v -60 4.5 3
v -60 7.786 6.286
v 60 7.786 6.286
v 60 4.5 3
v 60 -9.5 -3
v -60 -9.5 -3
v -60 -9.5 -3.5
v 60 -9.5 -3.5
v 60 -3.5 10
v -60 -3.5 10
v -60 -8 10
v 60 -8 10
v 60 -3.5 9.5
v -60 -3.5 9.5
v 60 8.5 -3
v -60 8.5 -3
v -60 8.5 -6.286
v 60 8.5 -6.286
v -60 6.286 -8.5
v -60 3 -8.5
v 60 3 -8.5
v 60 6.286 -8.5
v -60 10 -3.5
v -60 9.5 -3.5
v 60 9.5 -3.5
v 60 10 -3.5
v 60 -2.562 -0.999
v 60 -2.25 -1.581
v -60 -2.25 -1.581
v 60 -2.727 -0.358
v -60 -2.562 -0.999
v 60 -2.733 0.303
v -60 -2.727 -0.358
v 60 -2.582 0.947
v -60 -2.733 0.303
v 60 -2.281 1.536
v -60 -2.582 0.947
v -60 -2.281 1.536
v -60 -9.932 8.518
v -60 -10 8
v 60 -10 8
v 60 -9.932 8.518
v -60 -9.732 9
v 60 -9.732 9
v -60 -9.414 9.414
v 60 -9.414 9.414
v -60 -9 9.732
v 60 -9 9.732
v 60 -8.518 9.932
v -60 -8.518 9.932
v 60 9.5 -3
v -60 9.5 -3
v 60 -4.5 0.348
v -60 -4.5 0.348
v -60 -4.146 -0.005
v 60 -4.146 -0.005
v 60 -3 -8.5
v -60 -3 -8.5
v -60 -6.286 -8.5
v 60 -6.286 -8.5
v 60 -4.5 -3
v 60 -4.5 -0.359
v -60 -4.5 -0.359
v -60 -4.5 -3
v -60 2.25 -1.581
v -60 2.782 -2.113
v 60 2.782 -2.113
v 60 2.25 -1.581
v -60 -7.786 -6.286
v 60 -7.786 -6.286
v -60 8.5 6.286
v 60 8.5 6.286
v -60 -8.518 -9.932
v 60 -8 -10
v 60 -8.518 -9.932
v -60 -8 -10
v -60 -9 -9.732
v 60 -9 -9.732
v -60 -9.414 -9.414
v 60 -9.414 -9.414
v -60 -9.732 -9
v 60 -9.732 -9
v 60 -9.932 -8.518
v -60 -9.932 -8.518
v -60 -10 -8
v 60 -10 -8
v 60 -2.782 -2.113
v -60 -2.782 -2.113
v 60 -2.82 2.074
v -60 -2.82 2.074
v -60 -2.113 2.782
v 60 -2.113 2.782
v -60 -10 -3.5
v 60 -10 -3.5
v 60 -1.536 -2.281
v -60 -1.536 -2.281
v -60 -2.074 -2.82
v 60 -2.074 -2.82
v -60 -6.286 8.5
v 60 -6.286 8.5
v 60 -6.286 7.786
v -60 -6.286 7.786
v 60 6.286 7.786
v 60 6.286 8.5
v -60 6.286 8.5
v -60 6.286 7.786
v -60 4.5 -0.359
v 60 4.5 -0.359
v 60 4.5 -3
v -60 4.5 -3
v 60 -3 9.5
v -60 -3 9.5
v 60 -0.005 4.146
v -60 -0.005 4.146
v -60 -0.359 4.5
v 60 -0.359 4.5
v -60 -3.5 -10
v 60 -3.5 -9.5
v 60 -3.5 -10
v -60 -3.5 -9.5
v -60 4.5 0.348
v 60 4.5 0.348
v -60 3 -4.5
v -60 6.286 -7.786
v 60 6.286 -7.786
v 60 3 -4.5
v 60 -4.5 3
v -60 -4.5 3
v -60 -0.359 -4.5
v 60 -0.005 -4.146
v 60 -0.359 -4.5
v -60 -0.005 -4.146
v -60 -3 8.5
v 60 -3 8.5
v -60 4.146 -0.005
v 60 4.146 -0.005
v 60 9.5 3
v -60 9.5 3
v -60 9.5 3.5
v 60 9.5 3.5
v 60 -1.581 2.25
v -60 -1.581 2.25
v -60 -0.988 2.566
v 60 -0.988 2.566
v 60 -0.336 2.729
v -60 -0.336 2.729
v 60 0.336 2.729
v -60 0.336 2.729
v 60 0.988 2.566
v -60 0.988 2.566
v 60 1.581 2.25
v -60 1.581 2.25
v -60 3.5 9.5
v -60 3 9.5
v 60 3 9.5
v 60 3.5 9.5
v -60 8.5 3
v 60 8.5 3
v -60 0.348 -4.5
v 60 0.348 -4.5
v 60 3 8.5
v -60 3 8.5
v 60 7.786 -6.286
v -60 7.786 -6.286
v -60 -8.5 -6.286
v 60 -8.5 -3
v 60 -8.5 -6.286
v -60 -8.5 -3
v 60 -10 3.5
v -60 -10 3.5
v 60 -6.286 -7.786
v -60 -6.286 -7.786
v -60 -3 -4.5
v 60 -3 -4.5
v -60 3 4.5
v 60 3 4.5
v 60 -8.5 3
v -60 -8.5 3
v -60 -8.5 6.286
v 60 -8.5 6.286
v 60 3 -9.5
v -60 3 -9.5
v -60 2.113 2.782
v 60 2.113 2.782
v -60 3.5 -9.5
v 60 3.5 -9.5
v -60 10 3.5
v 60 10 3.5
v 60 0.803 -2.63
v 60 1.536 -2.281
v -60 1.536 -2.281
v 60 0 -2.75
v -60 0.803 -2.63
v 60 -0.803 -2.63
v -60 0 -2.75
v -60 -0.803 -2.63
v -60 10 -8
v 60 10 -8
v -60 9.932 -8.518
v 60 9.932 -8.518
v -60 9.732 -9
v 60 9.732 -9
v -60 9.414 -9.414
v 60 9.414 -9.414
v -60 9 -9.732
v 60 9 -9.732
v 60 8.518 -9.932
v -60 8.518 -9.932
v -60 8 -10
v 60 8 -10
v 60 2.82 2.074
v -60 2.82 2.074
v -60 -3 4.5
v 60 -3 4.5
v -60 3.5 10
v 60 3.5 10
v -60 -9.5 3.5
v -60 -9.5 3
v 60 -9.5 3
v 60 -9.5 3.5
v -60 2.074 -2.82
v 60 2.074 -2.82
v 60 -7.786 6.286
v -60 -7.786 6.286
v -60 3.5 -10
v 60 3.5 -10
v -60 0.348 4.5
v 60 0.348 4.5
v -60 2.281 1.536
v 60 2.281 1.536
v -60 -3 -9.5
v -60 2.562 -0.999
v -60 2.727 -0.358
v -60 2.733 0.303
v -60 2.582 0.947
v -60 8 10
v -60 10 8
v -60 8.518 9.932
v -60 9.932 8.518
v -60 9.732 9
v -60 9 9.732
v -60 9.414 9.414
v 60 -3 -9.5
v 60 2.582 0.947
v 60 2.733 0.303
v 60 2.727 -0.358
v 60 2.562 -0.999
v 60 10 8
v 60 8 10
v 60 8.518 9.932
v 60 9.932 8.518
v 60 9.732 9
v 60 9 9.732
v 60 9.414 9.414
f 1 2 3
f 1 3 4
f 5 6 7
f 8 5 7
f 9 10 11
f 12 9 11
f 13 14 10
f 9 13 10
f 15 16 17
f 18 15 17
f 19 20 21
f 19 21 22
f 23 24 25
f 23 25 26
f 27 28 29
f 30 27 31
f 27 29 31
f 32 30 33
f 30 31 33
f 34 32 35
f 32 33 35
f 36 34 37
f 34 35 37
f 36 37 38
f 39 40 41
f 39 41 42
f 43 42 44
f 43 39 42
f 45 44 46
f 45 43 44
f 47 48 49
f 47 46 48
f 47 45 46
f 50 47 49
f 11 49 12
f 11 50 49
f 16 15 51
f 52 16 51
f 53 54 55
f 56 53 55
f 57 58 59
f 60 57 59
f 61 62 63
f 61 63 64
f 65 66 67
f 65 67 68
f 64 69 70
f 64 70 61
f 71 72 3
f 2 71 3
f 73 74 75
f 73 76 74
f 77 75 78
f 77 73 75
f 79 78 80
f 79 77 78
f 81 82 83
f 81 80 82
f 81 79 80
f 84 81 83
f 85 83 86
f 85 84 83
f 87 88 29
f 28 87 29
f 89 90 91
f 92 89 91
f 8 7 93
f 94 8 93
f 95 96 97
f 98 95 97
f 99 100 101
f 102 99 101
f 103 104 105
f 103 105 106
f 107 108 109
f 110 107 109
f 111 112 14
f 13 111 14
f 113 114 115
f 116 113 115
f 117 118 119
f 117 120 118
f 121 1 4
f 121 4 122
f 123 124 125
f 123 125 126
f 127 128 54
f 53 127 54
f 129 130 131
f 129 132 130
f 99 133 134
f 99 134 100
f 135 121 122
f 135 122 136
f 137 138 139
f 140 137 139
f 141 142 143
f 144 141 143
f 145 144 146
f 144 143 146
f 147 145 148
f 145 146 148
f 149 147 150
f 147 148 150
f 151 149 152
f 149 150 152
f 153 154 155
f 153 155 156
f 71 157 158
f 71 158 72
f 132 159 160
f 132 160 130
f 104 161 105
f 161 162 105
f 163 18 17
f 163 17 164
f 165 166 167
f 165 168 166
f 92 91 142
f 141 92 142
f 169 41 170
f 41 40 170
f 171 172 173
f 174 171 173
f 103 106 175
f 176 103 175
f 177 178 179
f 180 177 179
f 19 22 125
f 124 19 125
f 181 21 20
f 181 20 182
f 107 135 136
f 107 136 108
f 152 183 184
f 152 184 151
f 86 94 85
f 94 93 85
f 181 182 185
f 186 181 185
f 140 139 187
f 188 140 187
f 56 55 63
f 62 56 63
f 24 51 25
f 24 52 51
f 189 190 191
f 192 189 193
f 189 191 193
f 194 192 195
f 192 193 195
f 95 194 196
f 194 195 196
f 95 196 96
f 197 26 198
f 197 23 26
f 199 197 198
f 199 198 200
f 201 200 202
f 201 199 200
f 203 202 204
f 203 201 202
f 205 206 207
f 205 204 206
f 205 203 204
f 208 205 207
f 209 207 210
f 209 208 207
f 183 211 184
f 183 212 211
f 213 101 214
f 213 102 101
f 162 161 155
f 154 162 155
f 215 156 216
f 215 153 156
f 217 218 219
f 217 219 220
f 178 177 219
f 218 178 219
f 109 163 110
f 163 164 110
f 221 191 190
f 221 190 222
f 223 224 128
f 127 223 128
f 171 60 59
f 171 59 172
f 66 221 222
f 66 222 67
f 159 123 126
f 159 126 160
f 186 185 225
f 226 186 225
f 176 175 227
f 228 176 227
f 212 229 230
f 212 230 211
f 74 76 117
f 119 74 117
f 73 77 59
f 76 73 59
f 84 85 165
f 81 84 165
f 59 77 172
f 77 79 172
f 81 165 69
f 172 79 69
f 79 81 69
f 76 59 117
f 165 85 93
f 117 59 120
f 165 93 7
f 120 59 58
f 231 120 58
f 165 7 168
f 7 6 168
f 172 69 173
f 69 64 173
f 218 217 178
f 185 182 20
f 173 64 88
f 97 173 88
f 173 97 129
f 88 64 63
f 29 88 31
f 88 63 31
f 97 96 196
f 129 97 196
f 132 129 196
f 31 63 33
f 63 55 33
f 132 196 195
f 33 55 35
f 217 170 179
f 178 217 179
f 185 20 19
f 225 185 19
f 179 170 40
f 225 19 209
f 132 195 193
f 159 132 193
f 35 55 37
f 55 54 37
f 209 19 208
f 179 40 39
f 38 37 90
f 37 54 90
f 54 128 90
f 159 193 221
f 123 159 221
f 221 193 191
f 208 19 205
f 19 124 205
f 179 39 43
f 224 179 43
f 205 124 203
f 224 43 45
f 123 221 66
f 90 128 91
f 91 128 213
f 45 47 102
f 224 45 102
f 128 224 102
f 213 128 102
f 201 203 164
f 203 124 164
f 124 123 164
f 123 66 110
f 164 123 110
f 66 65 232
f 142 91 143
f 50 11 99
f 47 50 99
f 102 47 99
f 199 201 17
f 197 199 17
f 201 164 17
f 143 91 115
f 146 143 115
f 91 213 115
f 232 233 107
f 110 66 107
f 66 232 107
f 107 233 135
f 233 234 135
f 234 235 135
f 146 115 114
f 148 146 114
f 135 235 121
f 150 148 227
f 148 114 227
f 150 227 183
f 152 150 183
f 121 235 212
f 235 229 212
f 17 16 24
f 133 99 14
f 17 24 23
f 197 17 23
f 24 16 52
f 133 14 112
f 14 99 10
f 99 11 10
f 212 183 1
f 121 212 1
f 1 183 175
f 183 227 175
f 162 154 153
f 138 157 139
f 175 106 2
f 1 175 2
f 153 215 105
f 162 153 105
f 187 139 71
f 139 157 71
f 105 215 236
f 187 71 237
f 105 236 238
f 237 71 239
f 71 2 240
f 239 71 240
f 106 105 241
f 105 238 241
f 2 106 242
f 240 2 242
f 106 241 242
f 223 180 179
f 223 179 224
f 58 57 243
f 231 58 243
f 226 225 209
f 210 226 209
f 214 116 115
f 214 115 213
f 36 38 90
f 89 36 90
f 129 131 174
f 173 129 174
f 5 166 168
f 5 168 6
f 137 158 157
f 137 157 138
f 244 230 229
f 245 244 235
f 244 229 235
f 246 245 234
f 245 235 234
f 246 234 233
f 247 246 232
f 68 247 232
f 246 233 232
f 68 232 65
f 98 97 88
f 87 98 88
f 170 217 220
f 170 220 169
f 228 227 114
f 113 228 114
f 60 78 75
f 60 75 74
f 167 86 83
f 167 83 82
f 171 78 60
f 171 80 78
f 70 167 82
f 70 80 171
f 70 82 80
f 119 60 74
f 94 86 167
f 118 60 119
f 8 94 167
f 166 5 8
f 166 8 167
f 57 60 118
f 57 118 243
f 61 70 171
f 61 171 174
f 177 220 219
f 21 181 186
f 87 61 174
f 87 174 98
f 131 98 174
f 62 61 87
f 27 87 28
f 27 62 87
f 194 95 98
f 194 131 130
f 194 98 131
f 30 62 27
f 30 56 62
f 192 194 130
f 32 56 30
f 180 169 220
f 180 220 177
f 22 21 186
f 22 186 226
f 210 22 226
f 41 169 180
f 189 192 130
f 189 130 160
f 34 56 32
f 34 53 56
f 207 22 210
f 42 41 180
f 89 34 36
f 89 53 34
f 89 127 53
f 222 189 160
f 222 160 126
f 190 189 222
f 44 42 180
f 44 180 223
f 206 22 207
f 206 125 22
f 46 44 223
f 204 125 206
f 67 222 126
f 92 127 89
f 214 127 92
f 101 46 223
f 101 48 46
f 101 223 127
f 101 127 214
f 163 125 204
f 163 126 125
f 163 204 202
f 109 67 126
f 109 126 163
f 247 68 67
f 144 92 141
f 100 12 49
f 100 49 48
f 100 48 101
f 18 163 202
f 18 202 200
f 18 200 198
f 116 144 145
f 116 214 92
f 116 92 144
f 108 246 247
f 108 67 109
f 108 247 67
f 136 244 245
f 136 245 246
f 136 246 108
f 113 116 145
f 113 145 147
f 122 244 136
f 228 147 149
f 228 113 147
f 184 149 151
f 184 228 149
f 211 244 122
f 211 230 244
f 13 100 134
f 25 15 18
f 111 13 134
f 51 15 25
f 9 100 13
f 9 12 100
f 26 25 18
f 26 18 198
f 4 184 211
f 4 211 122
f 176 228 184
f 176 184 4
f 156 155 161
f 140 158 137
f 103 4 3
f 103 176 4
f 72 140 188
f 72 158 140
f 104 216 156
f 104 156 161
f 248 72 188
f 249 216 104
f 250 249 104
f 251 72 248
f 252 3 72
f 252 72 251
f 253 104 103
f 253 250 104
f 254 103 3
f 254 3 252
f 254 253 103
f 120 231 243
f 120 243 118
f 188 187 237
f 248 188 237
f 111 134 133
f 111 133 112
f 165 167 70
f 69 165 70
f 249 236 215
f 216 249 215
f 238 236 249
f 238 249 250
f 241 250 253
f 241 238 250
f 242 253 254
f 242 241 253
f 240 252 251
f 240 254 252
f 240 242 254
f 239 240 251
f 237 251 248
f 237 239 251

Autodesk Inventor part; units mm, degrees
ref_plane "YZ Plane" through (0, 0, 0) normal (1, 0, 0) x (0, 1, 0)
ref_plane "XZ Plane" through (0, 0, 0) normal (0, 1, 0) x (-1, 0, 0)
ref_plane "XY Plane" through (0, 0, 0) normal (0, 0, 1) x (1, 0, 0)
sketch "Skizze1" plane through (0, 0, 0) normal (1, 0, 0) x (0, 1, 0)
  line L0 (-14.5799, 0) -> (14.5799, 0) projected
  line L1 (0, -14.5799) -> (0, 14.5799) projected
  line L2 (9.5, 3) -> (9.5, 3.5)
  line L3 (9.5, 3.5) -> (10, 3.5)
  line L4 (8.5, 3) -> (8.5, 6.2861)
  line L5 (7.7861, 6.2861) -> (4.5, 3)
  line L6 (8.5, 6.2861) -> (7.7861, 6.2861)
  line L7 (8.5, 3) -> (9.5, 3)
  line L8 (9.5, -3) -> (9.5, -3.5)
  line L9 (9.5, -3.5) -> (10, -3.5)
  line L10 (8.5, -3) -> (8.5, -6.2861)
  line L11 (7.7861, -6.2861) -> (4.5, -3)
  line L12 (8.5, -6.2861) -> (7.7861, -6.2861)
  line L13 (8.5, -3) -> (9.5, -3)
  line L14 (10, 3.5) -> (10, 8)
  line L15 (10, -3.5) -> (10, -8)
  line L16 (-9.5, 3) -> (-9.5, 3.5)
  line L17 (-9.5, 3.5) -> (-10, 3.5)
  line L18 (-8.5, 3) -> (-8.5, 6.2861)
  line L19 (-7.7861, 6.2861) -> (-4.5, 3)
  line L20 (-8.5, 6.2861) -> (-7.7861, 6.2861)
  line L21 (-8.5, 3) -> (-9.5, 3)
  line L22 (-8.5, -3) -> (-9.5, -3)
  line L23 (-8.5, -3) -> (-8.5, -6.2861)
  line L24 (-8.5, -6.2861) -> (-7.7861, -6.2861)
  line L25 (-7.7861, -6.2861) -> (-4.5, -3)
  line L26 (-9.5, -3) -> (-9.5, -3.5)
  line L27 (-9.5, -3.5) -> (-10, -3.5)
  line L28 (3, -9.5) -> (3.5, -9.5)
  line L29 (3.5, -9.5) -> (3.5, -10)
  line L30 (3, -8.5) -> (6.2861, -8.5)
  line L31 (6.2861, -7.7861) -> (3, -4.5)
  line L32 (6.2861, -8.5) -> (6.2861, -7.7861)
  line L33 (3, -8.5) -> (3, -9.5)
  line L34 (-3, -8.5) -> (-3, -9.5)
  line L35 (-3, -8.5) -> (-6.2861, -8.5)
  line L36 (-6.2861, -8.5) -> (-6.2861, -7.7861)
  line L37 (-6.2861, -7.7861) -> (-3, -4.5)
  line L38 (-3, -9.5) -> (-3.5, -9.5)
  line L39 (-3.5, -9.5) -> (-3.5, -10)
  line L40 (3.5, 9.5) -> (3.5, 10)
  line L41 (3, 9.5) -> (3.5, 9.5)
  line L42 (3, 8.5) -> (3, 9.5)
  line L43 (3, 8.5) -> (6.2861, 8.5)
  line L44 (6.2861, 8.5) -> (6.2861, 7.7861)
  line L45 (6.2861, 7.7861) -> (3, 4.5)
  line L46 (-6.2861, 7.7861) -> (-3, 4.5)
  line L47 (-6.2861, 8.5) -> (-6.2861, 7.7861)
  line L48 (-3, 8.5) -> (-6.2861, 8.5)
  line L49 (-3, 8.5) -> (-3, 9.5)
  line L50 (-3, 9.5) -> (-3.5, 9.5)
  line L51 (-3.5, 9.5) -> (-3.5, 10)
  line L52 (8, 10) -> (3.5, 10)
  line L53 (-3.5, 10) -> (-8, 10)
  line L54 (-10, 8) -> (-10, 3.5)
  line L55 (-10, -3.5) -> (-10, -8)
  line L56 (-8, -10) -> (-3.5, -10)
  line L57 (3.5, -10) -> (8, -10)
  arc A0 (10, 8) -> (8, 10) centre (8, 8) ccw
  arc A1 (8, -10) -> (10, -8) centre (8, -8) ccw
  arc A2 (-10, -8) -> (-8, -10) centre (-8, -8) ccw
  arc A3 (-8, 10) -> (-10, 8) centre (-8, 8) ccw
  line L58 (-2.8201, 2.0744) -> (-2.113, 2.7815)
  line L59 (-2.113, 2.7815) -> (-1.5814, 2.2498)
  line L60 (-2.2813, 1.5356) -> (-2.8201, 2.0744)
  line L61 (2.8201, 2.0744) -> (2.113, 2.7815)
  line L62 (2.113, 2.7815) -> (1.5814, 2.2498)
  line L63 (2.2813, 1.5356) -> (2.8201, 2.0744)
  line L64 (2.0744, -2.8201) -> (2.7815, -2.113)
  line L65 (2.7815, -2.113) -> (2.2498, -1.5814)
  line L66 (1.5356, -2.2813) -> (2.0744, -2.8201)
  line L67 (-2.7815, -2.113) -> (-2.2498, -1.5814)
  line L68 (-2.0744, -2.8201) -> (-2.7815, -2.113)
  line L69 (-1.5356, -2.2813) -> (-2.0744, -2.8201)
  arc A4 (1.5814, 2.2498) -> (-1.5814, 2.2498) centre (0, 0) ccw
  arc A5 (1.5814, 2.2498) -> (-1.5814, 2.2498) centre (0, 0) ccw
  arc A6 (2.2498, -1.5814) -> (2.2813, 1.5356) centre (0, 0) ccw
  arc A7 (2.2498, -1.5814) -> (2.2813, 1.5356) centre (0, 0) ccw
  arc A8 (-2.2813, 1.5356) -> (-2.2498, -1.5814) centre (0, 0) ccw
  arc A9 (-1.5356, -2.2813) -> (1.5356, -2.2813) centre (0, 0) ccw
  arc A10 (-2.2813, 1.5356) -> (-2.2498, -1.5814) centre (0, 0) ccw
  arc A11 (-1.5356, -2.2813) -> (1.5356, -2.2813) centre (0, 0) ccw
  line L70 (0.3484, 4.5) -> (-0.0051, 4.1465)
  line L71 (-0.0051, 4.1465) -> (-0.3589, 4.5)
  line L72 (3, 4.5) -> (0.3484, 4.5)
  line L73 (-0.3589, 4.5) -> (-3, 4.5)
  line L74 (4.5, 0.3484) -> (4.1465, -0.0051)
  line L75 (4.1465, -0.0051) -> (4.5, -0.3589)
  line L76 (0.3484, -4.5) -> (-0.0051, -4.1465)
  line L77 (-0.0051, -4.1465) -> (-0.3589, -4.5)
  line L78 (-4.5, 0.3484) -> (-4.1465, -0.0051)
  line L79 (-4.1465, -0.0051) -> (-4.5, -0.3589)
  line L80 (4.5, 3) -> (4.5, 0.3484)
  line L81 (4.5, -0.3589) -> (4.5, -3)
  line L82 (3, -4.5) -> (0.3484, -4.5)
  line L83 (-0.3589, -4.5) -> (-3, -4.5)
  line L84 (-4.5, 3) -> (-4.5, 0.3484)
  line L85 (-4.5, -0.3589) -> (-4.5, -3)
  point P0 (-10, -10)
  point P1 (-10, 10)
  point P2 (10, -10)
  dimension "d0" = 20
  dimension "d1" = 20
  dimension "d4" = 6
  dimension "d9" = 0.5
  dimension "d10" = 0.5
  dimension "d13" = 45
  dimension "d14" = 3.2861
  dimension "d16" = 3
  dimension "d17" = 3.5
  dimension "d19" = 6
  dimension "d20" = 0.5
  dimension "d21" = 0.5
  dimension "d22" = 45
  dimension "d23" = 3.2861
  dimension "d25" = 2
extrude "Extrusion1" add sketch "Skizze1" along normal mid plane 120 contours L78 L84 L19 L20 L18 L21 L16 L17 L54 A3 L53 L51 L50 L49 L48 L47 L46 L73 L71 L70 L1 A4 L59 L58 L60 A8 L0 | L0 A8 L67 L68 L69 A9 L1 L76 L77 L83 L37 L36 L35 L34 L38 L39 L56 A2 L55 L27 L26 L22 L23 L24 L25 L85 L79 L78 | A6 L63 L61 L62 A4 L1 L70 L72 L45 L44 L43 L42 L41 L40 L52 A0 L14 L3 L2 L7 L4 L6 L5 L80 L74 L0 | L0 L74 L75 L81 L11 L12 L10 L13 L8 L9 L15 A1 L57 L29 L28 L33 L30 L32 L31 L82 L76 L1 A9 L66 L64 L65 A6
properties part number "Motedius_20x20_B-Type_Slot-6_120" material "Aluminium 6061"
